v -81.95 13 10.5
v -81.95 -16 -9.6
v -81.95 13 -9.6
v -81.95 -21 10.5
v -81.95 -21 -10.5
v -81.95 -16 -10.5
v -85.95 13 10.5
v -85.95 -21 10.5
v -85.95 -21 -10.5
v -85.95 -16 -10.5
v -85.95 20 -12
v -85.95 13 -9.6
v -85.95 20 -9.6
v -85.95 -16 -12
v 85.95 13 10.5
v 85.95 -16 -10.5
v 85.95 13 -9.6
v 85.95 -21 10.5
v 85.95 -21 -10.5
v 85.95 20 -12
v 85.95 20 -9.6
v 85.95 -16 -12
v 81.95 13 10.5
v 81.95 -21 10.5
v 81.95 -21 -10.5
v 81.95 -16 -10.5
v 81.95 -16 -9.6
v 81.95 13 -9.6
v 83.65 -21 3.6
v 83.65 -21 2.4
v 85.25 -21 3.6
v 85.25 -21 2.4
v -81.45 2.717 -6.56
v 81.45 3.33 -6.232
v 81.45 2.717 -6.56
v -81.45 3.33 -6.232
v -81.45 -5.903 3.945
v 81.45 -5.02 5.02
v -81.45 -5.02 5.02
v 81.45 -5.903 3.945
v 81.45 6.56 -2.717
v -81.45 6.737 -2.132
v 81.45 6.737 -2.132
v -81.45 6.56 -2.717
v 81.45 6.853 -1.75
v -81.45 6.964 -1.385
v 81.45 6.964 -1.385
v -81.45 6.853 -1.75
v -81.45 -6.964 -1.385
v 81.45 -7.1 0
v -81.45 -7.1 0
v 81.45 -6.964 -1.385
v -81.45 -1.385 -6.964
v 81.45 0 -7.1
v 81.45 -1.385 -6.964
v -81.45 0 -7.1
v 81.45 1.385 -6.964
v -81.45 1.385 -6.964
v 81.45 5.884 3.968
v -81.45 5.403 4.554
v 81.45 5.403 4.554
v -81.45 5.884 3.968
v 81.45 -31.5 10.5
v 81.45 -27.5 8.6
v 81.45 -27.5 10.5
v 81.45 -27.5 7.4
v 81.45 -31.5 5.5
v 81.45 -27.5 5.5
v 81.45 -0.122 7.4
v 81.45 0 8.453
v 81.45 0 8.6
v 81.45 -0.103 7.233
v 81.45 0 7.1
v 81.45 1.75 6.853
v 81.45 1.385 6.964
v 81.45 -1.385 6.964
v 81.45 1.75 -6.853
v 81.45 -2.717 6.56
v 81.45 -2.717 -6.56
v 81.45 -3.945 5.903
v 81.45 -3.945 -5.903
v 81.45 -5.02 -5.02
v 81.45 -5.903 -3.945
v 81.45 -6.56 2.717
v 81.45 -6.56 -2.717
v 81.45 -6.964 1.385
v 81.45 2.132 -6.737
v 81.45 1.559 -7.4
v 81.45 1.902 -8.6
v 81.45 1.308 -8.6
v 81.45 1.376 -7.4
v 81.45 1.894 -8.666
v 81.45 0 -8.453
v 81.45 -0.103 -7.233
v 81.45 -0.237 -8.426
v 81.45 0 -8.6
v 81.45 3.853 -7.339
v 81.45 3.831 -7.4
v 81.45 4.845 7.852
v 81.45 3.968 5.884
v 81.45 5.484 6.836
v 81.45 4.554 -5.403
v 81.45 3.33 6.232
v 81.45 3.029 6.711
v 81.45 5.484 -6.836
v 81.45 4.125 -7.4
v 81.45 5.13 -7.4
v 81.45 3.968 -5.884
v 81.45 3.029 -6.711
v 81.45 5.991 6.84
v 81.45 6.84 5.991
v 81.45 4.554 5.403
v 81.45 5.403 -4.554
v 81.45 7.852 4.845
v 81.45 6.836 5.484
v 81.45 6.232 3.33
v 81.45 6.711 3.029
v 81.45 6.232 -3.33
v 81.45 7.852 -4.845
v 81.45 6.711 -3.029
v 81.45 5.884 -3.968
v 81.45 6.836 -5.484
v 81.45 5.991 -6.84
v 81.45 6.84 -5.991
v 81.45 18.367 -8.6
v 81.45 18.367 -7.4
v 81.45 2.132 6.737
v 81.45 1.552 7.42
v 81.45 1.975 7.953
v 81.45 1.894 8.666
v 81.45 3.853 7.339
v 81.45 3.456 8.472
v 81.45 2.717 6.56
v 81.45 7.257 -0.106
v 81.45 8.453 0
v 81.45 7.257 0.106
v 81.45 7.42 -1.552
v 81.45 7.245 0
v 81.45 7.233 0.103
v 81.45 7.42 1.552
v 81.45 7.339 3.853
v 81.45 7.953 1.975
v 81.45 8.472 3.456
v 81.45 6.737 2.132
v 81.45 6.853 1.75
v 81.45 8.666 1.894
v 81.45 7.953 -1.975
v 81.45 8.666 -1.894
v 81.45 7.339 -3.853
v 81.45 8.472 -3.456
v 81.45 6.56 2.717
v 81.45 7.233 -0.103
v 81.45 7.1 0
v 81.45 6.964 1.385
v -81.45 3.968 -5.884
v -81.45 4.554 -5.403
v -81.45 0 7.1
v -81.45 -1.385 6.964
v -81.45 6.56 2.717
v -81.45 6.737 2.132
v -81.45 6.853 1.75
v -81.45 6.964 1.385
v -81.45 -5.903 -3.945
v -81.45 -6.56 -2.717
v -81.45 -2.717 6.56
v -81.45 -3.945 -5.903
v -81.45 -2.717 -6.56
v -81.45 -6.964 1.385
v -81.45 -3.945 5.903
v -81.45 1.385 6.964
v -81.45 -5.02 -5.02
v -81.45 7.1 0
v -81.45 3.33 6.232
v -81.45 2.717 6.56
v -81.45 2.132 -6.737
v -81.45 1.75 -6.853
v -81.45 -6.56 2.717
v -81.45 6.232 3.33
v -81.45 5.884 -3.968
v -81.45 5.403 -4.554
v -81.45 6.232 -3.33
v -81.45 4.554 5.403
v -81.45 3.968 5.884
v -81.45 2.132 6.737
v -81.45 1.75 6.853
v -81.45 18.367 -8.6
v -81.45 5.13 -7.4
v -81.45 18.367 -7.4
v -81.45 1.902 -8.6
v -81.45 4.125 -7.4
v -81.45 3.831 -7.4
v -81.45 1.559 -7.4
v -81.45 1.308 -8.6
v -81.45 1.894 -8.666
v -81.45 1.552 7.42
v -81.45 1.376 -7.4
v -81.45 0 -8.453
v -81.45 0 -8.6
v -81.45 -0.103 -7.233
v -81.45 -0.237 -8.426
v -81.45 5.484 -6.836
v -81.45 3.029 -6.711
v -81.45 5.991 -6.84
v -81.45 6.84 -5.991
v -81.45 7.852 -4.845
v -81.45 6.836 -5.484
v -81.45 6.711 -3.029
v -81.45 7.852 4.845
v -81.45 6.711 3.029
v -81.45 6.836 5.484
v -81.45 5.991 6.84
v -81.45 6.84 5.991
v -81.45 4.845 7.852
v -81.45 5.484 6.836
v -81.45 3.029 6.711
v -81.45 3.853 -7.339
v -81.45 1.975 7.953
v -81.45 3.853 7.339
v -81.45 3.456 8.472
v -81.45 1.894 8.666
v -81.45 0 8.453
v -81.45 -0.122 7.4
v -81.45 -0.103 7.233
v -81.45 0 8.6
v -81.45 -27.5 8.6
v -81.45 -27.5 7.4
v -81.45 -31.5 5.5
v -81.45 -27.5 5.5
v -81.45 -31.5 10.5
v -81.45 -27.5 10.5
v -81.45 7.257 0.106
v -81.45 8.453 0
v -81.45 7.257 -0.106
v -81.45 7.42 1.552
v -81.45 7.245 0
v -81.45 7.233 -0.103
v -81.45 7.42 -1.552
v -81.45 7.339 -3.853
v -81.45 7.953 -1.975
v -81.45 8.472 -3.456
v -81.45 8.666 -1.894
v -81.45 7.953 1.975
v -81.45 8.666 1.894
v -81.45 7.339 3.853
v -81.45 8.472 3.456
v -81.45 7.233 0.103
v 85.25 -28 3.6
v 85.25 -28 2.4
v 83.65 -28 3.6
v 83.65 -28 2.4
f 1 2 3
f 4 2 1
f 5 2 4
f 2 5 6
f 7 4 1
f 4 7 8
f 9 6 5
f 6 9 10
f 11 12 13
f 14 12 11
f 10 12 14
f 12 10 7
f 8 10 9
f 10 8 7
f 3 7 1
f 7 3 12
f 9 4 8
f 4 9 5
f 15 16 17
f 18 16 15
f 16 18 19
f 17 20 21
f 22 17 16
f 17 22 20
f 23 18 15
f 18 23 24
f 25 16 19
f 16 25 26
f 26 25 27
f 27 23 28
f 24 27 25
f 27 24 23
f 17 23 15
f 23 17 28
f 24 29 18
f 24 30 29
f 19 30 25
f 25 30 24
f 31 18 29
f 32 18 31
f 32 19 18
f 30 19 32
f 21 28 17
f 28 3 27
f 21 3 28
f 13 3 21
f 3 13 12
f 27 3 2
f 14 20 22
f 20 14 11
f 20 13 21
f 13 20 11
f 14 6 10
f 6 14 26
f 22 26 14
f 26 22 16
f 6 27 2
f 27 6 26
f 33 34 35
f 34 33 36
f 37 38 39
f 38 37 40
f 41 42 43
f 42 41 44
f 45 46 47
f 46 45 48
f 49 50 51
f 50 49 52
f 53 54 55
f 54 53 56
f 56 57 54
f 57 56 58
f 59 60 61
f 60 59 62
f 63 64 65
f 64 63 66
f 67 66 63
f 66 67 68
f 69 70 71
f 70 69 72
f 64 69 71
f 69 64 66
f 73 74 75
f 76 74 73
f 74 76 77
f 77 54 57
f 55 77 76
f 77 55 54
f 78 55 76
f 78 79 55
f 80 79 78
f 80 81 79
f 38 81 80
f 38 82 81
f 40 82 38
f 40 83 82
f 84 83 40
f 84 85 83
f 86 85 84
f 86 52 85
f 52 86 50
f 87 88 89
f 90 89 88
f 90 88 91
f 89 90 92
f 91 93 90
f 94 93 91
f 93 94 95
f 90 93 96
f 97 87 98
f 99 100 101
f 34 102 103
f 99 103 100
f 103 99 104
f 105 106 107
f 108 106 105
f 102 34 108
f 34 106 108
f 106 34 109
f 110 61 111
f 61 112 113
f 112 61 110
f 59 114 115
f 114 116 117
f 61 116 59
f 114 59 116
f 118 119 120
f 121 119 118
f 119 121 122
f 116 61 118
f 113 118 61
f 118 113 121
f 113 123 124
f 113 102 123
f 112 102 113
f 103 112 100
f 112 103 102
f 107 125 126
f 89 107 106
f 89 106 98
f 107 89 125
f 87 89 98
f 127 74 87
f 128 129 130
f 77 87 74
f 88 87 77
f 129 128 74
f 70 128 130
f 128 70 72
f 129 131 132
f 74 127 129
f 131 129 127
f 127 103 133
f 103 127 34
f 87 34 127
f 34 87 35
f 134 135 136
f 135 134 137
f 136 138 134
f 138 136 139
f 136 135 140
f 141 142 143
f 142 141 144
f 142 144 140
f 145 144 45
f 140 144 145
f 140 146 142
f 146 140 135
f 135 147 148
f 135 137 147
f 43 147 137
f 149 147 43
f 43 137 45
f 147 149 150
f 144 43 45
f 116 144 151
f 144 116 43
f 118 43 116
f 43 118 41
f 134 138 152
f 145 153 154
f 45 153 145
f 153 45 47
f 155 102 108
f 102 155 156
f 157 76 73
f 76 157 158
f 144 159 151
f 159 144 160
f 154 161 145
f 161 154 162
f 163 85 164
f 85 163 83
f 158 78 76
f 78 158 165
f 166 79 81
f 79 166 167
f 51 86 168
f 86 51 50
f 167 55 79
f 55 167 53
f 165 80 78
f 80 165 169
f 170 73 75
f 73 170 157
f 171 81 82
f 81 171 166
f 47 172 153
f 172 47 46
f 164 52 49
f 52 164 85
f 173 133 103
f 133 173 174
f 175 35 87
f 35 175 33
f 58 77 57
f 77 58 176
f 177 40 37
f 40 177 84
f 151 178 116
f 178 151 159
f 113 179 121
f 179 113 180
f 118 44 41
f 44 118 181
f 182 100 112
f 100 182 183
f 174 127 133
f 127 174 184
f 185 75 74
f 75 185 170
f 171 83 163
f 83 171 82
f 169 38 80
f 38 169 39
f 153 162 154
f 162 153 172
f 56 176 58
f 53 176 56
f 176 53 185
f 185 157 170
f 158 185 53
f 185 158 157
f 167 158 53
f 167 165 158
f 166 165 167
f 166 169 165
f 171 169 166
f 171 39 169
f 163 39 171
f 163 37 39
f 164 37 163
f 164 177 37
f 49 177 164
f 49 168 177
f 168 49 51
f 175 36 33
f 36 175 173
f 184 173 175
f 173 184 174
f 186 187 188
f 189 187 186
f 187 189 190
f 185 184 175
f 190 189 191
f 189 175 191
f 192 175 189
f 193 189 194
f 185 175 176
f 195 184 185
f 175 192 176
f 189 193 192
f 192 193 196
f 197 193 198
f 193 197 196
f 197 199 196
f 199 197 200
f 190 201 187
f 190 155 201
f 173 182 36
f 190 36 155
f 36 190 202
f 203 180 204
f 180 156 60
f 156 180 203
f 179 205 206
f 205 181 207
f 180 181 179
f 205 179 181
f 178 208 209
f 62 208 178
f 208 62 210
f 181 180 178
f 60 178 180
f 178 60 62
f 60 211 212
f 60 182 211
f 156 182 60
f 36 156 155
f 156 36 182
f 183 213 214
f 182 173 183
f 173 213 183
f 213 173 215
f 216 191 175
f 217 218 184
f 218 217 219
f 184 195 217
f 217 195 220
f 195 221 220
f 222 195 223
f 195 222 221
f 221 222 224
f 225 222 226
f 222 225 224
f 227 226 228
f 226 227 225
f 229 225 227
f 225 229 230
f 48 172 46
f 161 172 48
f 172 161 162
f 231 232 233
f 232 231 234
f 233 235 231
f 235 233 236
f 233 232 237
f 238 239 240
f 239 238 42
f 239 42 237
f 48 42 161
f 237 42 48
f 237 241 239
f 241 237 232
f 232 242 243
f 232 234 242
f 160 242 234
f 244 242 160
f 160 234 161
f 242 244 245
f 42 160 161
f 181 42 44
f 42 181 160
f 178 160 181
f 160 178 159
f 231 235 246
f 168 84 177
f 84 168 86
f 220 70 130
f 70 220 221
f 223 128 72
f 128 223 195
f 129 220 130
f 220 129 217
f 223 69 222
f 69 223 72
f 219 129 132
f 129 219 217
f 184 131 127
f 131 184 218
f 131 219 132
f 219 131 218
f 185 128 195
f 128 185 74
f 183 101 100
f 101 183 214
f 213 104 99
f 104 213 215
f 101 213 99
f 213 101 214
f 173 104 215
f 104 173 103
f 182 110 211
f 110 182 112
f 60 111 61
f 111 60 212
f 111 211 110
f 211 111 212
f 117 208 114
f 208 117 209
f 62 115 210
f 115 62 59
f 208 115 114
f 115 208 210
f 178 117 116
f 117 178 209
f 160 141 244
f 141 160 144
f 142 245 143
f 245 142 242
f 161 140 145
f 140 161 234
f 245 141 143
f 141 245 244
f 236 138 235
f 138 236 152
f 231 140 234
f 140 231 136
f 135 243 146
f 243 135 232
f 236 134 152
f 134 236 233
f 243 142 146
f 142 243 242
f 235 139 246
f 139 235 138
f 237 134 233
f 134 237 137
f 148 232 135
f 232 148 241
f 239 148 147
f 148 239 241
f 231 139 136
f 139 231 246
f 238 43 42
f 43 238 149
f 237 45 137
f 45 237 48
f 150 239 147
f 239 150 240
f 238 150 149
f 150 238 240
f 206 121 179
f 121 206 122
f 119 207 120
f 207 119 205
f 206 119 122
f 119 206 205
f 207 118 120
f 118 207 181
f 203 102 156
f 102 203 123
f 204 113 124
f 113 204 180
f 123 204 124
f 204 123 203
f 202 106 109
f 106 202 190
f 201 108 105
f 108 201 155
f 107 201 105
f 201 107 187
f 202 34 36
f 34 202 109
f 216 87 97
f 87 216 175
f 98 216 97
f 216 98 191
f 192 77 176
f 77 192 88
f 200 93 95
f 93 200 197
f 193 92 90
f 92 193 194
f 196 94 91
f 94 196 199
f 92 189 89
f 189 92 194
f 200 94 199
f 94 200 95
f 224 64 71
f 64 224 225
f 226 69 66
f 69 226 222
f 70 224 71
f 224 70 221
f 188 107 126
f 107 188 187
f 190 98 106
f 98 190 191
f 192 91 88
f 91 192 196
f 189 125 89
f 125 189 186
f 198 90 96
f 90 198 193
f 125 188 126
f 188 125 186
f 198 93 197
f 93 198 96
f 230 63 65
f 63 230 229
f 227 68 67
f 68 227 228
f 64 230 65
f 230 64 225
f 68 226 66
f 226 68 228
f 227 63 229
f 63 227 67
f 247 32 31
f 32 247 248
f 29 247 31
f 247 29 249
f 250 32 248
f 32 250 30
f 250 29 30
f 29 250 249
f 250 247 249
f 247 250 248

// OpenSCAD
// NEXUS ONE - ROLL architecture v0.6
// One REAL flexible AMOLED (162.9 x 74.5 x 1.2 mm module class, 2400x1080)
// wraps an R8 drum inside the spine; a sliding leading bar unrolls it.
// Replaces MECH-B's 3 stacked display frames: a continuous panel cannot fold
// at MECH-B's 3.4 mm layer pitch (bend radius would be ~1.7 mm; AMOLED needs
// >= ~5 mm). Wrap radius here is 8 mm at EVERY pose (checker-verified:
// panel length conserved exactly, 1,001 poses).
// Interlocks designed in:
//  1. Rack on the leading bar drives the drum pinion (module 0.5, 32 teeth,
//     pitch radius = drum radius 8) - panel feed rate == bar speed, the panel
//     can never be yanked faster than the drum feeds it.
//  2. Light-field lenticular cover rail-mounts only at full deployment; while
//     mounted its rails block retraction (film can never be crushed by closing).
//  3. Spring-ball detents + 2 pairs N52 5x2 magnets hold both end positions
//     (retention spec >= 3 N, from the v0.4 jolt analysis).
// OpenSCAD: View > Animate, Steps=201, FPS=20. $t = deployment 0..1.
// NOT compiled - OpenSCAD unavailable in the build environment (balance-checked).
// X = device length (panel length); Y = deployment; Z = panel normal.

$fn = 32;
panel_l = 162.9;
panel_t = 1.2;
L_use = 71.5;            // usable panel width (74.5 - 2x1.5 sealed edges)
R = 8;                   // drum radius to panel centreline
F0 = 28;                 // front flat, stick mode (visible strip)
F1 = 58.9;               // front flat, fully open
dev_l = 171.9;
show_cover = false;      // light-field cover (stored in carry-case sleeve)

function front(u) = F0 + (F1 - F0) * u;
function back_flat(u) =
    let (b0 = L_use - F0 - PI * R)
    u < 0.85 ? max(0, b0 * (1 - u / 0.85)) : 0;
function theta(u) = (L_use - front(u) - back_flat(u)) / R;   // radians, pi..pi/2

module panel_ribbon(u) {
    F = front(u); B = back_flat(u); th = theta(u);
    color([0.15, 0.45, 0.95, 0.95]) {
        // front flat
        translate([0, -F / 2, R]) cube([panel_l, F, panel_t], center = true);
        // back flat
        if (B > 0.3)
            translate([0, B / 2, -R]) cube([panel_l, B, panel_t], center = true);
        // wrap arc as chord segments
        K = 14;
        for (i = [0 : K - 1]) {
            a_deg = 90 - (i + 0.5) * th * 180 / PI / K;
            seg = R * th / K + 0.35;
            translate([0, R * cos(a_deg), R * sin(a_deg)])
                rotate([90 - a_deg, 0, 0])
                    cube([panel_l, seg, panel_t], center = true);
        }
    }
}

module drum() {
    color([0.55, 0.58, 0.63, 1])
    rotate([0, 90, 0]) cylinder(h = panel_l, r = R - panel_t / 2 - 0.3, center = true);
    // pinion gear (sync interlock) - schematic: cylinder + teeth blocks
    color([0.85, 0.65, 0.2, 1])
    translate([panel_l / 2 + 3, 0, 0]) rotate([0, 90, 0])
        cylinder(h = 1.6, r = R, center = true);
}

module leading_bar(u) {
    F = front(u);
    color([0.2, 0.22, 0.27, 1])
    translate([0, -F - 1.5, R]) cube([panel_l, 4, 5], center = true);
    // rack (schematic teeth) on the bar underside, meshes the drum pinion path
    color([0.85, 0.65, 0.2, 1])
    translate([panel_l / 2 + 3, -F + 6, R - 5]) cube([1.6, 12, 1.2], center = true);
}

module housing(u) {
    // back shell + two end caps; front stays open (the panel IS the front)
    color([0.13, 0.15, 0.19, 0.9])
    translate([0, 2, -R - panel_t - 1.6]) cube([dev_l, 36, 2.4], center = true);
    for (sx = [-1, 1])
        color([0.13, 0.15, 0.19, 1])
        translate([sx * (dev_l / 2 - 2), -4, 0]) cube([4, 34, 21], center = true);
}

module light_field_cover() {
    // mounts only at full open; shown hovering at its mounted plane
    cover_y = -F1 + (F1 + R * PI / 2) / 2;
    color([0.6, 0.85, 1.0, 0.35])
    translate([0, cover_y, R + panel_t + 1.5])
        cube([panel_l, F1 + R * PI / 2, 0.5], center = true);
}

u = min(1, max(0, $t));
housing(u);
drum();
panel_ribbon(u);
leading_bar(u);
if (show_cover) light_field_cover();

// Open items: dynamic rolling cycle rating of the maker panel (unverified),
// FPC routing from the wrapped panel to the board, drum spring/motor sizing,
// antenna windows in end caps, module bay (v0.4 audit parts) not yet integrated.
